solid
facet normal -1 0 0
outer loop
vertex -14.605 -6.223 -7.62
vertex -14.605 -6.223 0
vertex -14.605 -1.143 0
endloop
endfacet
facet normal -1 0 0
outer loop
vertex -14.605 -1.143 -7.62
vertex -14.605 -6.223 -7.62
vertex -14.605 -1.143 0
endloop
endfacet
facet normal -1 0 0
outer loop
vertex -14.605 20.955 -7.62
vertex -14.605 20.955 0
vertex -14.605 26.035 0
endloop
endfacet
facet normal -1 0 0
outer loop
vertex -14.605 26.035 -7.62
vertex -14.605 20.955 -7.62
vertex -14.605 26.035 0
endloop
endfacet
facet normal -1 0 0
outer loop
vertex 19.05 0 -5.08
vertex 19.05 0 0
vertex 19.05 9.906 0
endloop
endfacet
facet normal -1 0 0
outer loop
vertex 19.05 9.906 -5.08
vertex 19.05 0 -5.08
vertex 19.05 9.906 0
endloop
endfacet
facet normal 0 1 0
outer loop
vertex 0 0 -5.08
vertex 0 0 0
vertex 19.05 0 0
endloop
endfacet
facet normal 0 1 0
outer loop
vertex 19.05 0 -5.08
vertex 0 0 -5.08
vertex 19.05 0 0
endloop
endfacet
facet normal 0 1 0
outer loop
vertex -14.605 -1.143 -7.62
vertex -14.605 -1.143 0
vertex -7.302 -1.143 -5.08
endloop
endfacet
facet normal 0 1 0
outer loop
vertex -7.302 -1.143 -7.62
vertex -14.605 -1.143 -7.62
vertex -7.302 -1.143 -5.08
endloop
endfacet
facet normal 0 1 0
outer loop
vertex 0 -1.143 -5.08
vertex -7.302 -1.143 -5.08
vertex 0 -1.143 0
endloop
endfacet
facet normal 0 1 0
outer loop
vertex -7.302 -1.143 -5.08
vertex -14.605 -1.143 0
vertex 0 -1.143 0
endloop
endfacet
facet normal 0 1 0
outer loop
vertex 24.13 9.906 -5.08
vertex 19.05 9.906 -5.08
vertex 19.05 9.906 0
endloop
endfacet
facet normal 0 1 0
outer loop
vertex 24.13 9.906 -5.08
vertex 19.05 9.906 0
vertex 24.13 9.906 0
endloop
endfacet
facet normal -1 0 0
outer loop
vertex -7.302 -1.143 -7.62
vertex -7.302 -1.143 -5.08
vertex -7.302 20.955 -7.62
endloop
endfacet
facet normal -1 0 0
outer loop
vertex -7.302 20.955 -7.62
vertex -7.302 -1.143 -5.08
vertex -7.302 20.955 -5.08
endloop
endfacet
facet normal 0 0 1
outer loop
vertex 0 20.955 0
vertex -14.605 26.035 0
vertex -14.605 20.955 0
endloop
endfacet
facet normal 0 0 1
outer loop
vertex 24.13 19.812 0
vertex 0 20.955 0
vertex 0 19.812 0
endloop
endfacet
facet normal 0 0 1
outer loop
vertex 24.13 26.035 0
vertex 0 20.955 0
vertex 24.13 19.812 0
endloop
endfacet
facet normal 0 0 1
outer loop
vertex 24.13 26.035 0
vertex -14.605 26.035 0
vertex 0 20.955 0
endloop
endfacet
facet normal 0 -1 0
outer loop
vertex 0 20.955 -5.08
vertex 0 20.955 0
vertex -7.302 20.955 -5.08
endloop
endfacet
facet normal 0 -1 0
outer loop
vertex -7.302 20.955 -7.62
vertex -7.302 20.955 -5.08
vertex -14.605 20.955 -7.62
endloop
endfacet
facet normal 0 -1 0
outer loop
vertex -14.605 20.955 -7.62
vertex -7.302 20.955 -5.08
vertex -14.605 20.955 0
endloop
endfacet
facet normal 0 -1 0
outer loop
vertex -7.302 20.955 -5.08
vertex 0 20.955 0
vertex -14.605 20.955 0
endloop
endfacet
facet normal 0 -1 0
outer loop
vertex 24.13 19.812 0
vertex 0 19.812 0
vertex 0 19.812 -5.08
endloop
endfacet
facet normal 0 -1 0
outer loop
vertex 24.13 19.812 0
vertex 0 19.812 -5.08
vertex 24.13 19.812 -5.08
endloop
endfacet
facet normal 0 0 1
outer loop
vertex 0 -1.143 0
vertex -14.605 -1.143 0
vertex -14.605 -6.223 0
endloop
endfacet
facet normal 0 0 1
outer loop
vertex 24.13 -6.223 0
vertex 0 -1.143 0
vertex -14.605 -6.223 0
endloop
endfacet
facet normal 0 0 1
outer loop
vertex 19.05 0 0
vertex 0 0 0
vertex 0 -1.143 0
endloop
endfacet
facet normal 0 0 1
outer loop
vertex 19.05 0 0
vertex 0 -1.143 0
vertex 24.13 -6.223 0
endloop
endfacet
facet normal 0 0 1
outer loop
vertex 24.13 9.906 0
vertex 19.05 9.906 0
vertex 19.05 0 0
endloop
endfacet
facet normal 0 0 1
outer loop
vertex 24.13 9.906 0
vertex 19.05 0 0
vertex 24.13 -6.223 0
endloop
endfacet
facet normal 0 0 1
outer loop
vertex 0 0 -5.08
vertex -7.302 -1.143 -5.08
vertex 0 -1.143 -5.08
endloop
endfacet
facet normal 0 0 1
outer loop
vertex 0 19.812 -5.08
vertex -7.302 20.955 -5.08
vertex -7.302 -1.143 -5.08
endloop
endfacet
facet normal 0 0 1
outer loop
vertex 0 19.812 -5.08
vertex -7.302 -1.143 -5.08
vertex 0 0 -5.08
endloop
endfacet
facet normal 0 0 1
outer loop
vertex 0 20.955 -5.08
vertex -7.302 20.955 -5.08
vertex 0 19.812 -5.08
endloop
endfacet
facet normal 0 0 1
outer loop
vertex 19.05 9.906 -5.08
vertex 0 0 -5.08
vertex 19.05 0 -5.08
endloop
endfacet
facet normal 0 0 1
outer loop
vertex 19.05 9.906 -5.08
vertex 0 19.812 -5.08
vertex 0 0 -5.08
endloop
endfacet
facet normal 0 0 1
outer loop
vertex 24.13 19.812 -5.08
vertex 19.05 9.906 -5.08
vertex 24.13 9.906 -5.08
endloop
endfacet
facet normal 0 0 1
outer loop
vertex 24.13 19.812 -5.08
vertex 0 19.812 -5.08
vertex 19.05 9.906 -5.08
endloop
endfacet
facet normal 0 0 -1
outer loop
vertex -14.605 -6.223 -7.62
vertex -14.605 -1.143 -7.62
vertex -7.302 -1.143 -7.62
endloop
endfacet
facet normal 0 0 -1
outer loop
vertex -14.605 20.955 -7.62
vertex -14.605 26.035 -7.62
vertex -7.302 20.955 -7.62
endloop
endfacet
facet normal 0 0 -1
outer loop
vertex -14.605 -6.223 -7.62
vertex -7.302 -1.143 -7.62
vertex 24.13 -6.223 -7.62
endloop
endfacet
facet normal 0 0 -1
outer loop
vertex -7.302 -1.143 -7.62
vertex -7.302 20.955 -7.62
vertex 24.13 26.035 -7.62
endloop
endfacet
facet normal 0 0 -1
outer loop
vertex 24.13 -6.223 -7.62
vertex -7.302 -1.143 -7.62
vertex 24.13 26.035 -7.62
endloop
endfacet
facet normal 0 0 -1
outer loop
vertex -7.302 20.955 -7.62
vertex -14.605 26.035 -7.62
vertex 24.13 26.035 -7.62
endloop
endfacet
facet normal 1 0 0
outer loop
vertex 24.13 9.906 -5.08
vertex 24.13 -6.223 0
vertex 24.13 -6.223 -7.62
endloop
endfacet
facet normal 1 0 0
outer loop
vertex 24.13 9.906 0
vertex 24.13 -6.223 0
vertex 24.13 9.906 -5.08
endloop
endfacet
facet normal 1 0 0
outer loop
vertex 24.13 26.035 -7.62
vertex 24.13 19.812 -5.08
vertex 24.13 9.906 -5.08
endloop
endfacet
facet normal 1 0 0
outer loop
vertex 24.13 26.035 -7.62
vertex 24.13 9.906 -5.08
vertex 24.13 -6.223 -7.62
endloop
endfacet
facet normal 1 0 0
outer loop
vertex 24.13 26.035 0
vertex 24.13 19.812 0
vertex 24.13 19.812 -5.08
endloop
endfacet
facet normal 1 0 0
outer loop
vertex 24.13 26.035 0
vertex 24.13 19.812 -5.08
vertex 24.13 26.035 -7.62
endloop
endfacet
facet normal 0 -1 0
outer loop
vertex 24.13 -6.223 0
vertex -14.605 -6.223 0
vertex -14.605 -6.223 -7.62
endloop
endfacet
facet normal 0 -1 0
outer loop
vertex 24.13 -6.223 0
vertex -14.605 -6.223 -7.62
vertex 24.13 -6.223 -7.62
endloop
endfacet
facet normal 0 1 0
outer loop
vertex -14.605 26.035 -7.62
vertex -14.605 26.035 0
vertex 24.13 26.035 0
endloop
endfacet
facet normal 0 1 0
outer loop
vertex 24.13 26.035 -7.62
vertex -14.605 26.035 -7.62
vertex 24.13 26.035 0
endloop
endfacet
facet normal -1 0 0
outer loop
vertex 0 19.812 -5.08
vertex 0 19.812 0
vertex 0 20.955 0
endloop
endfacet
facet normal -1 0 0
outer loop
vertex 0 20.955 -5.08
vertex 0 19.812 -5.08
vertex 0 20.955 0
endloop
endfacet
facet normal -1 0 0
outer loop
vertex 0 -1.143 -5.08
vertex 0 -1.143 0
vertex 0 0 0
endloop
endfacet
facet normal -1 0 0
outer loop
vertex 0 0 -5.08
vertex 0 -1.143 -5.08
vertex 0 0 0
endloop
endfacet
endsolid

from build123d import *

# Parameters (mm, degrees)
F0_W      = 19.05
F0_H      = 19.812
F1_DEPTH  = 2.54
F2_DEPTH  = 2.54
F0_W_2    = 14.605
F0_H_2    = 1.143
F3_DEPTH  = 2.54
F4_W      = 38.735
F4_H      = 32.258
F5_DEPTH  = 7.62
F6_DEPTH  = 7.62
F7_W      = 7.3025
F7_H      = 22.098
F8_DEPTH  = 2.54
F9_W      = 5.08
F9_H      = 9.906
F10_DEPTH = 5.08


with BuildPart() as f1:
    # F0 (on Top) → F1 (new body)
    with BuildSketch(Plane.XY):
        with Locations((9.525, 9.906)):
            Rectangle(F0_W, F0_H)
    extrude(amount=F1_DEPTH)

    # F0 (on Top) → F2 (join)
    with BuildSketch(Plane.XY):
        Polygon((-14.605, 0), (0, 0), (0, 19.812), (0, 20.955), (-14.605, 20.955), align=None)
    extrude(amount=F2_DEPTH)

    # F0 (on Top) → F3 (join)
    with BuildSketch(Plane.XY):
        with Locations((-7.3025, -0.5715)):
            Rectangle(F0_W_2, F0_H_2)
    extrude(amount=F3_DEPTH)

    # F4 (on Top) → F5 (join)
    with BuildSketch(Plane.XY):
        with Locations((4.7625, 9.906)):
            Rectangle(F4_W, F4_H)
    extrude(amount=-F5_DEPTH)

    # F3_face (on face) → F6 (cut)
    with BuildSketch(Plane(origin=(1.768302, 9.906, 2.54), x_dir=(1, 0, 0), z_dir=(0, 0, 1))):
        Polygon((-1.768302, -9.906), (17.281698, -9.906), (17.281698, 9.906), (-1.768302, 9.906), (-1.768302, 11.049), (-16.373302, 11.049), (-16.373302, -11.049), (-1.768302, -11.049), align=None)
    extrude(amount=-F6_DEPTH, mode=Mode.SUBTRACT)

    # F7 (on face) → F8 (cut)
    with BuildSketch(Plane.XY.offset(-5.08)):
        with Locations((-10.95375, 9.906)):
            Rectangle(F7_W, F7_H)
    extrude(amount=-F8_DEPTH, mode=Mode.SUBTRACT)

    # F9 (on face) → F10 (cut)
    with BuildSketch(Plane.XY):
        with Locations((21.59, 14.859)):
            Rectangle(F9_W, F9_H)
    extrude(amount=-F10_DEPTH, mode=Mode.SUBTRACT)


solid = f1.part
